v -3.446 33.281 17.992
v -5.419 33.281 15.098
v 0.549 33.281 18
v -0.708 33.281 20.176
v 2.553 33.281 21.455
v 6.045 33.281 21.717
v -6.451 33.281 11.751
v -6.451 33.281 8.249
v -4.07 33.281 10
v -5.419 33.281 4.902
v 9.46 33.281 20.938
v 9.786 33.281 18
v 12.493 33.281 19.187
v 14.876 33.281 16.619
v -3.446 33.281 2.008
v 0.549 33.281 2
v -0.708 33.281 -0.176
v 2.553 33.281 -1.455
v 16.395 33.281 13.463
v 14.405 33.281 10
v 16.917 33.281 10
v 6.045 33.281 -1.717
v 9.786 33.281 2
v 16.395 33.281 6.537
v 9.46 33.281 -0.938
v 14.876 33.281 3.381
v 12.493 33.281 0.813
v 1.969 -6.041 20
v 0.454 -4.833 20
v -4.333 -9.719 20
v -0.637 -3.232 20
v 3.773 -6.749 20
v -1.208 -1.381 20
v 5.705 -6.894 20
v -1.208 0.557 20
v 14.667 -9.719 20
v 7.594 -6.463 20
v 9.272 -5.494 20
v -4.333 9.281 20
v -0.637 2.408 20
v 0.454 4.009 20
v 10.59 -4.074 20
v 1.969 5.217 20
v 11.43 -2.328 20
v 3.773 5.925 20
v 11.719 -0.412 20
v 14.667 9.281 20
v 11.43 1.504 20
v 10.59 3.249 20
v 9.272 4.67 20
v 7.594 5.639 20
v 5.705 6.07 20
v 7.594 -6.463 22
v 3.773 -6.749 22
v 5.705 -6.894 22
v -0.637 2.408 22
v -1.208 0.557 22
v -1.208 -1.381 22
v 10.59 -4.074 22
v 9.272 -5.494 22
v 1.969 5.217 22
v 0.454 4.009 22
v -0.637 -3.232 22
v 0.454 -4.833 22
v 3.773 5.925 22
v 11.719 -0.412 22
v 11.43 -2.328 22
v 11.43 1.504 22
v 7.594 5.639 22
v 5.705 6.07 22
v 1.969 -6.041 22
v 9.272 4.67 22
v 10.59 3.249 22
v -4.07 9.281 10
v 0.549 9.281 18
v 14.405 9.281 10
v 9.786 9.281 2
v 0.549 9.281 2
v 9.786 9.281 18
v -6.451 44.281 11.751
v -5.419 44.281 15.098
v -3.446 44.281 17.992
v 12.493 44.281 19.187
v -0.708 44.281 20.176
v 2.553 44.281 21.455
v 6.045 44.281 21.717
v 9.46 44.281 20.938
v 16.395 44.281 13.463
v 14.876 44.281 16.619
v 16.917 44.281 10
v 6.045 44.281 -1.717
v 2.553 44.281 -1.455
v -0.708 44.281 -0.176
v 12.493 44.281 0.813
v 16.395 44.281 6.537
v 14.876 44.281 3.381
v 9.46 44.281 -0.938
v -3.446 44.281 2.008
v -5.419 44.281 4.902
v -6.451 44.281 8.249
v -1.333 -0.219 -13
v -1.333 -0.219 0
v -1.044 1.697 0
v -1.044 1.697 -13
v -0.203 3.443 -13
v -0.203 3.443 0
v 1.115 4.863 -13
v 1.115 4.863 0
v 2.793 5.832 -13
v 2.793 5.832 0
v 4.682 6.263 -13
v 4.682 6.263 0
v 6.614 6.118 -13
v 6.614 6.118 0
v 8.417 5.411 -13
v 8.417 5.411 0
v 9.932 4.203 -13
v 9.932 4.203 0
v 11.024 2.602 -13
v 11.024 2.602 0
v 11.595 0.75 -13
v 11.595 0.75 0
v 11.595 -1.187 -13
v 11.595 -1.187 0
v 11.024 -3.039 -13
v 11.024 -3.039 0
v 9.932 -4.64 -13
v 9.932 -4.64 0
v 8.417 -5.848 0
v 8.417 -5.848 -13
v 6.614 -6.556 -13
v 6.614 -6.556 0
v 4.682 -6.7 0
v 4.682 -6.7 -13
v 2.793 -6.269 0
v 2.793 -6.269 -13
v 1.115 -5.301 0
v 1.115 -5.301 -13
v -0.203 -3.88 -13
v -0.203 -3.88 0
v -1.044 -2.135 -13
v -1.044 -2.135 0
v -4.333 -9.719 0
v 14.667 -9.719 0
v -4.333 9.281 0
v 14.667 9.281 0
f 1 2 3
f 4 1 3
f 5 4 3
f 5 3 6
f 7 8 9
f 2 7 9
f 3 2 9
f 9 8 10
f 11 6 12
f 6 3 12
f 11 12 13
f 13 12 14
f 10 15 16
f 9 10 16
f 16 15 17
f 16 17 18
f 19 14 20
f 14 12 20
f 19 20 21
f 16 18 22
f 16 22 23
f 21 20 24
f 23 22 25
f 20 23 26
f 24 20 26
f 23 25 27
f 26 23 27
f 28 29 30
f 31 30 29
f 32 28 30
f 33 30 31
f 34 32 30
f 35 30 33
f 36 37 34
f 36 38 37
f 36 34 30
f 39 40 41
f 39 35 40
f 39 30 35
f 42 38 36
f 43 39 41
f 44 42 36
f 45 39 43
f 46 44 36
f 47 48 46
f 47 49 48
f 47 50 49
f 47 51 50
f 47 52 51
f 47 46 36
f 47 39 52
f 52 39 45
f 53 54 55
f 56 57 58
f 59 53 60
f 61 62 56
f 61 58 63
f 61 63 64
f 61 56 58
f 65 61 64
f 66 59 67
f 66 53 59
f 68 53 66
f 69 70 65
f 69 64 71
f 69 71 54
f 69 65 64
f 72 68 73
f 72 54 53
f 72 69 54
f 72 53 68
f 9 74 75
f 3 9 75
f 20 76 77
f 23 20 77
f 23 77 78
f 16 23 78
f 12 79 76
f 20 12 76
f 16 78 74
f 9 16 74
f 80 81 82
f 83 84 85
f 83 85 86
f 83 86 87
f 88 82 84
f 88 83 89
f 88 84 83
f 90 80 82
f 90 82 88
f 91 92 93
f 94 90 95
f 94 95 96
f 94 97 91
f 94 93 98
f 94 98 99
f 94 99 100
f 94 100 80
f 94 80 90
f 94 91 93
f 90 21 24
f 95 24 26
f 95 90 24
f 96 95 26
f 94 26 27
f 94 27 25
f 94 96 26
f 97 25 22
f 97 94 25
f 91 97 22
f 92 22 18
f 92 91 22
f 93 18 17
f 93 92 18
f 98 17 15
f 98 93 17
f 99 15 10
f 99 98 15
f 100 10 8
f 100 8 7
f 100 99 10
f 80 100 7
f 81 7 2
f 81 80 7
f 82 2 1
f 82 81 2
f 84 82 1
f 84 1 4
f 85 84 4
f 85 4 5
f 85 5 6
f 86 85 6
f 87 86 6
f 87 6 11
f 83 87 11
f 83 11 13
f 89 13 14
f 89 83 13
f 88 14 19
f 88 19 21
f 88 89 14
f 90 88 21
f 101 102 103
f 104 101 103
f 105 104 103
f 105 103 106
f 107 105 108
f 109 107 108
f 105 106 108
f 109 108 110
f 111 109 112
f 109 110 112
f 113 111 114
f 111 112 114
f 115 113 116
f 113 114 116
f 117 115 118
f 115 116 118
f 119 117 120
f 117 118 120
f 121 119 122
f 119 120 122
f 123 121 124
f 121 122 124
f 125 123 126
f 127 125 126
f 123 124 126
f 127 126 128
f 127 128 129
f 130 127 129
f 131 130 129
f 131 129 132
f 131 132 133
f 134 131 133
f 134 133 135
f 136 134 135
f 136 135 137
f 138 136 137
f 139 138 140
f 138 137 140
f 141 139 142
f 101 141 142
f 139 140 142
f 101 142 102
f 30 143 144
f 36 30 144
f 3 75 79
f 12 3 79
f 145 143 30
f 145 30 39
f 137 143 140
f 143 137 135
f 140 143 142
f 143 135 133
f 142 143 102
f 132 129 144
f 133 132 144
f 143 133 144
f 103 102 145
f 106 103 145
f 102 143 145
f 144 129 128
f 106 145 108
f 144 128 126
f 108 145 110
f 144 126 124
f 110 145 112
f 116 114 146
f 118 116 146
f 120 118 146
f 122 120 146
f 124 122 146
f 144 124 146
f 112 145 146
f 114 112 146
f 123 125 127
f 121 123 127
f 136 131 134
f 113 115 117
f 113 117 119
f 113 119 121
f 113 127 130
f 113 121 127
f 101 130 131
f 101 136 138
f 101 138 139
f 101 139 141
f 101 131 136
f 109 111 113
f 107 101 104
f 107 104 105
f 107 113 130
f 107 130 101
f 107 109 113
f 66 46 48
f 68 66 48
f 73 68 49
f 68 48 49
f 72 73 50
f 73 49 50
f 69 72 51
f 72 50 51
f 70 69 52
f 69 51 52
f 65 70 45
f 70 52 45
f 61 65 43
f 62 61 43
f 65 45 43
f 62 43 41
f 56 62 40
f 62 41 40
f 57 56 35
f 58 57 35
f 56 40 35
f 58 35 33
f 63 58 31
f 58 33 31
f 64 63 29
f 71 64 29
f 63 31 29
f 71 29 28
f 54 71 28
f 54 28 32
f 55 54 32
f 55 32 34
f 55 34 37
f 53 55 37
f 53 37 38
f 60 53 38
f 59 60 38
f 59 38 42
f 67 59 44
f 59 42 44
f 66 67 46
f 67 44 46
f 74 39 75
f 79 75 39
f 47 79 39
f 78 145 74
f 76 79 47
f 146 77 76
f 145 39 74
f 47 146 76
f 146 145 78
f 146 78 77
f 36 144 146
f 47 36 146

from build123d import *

# Parameters (mm, degrees)
SKETCH1_W           = 19
SKETCH1_H           = 19
BOSS_EXTRUDE1_DEPTH = 20
SKETCH2_R           = 6.5
BOSS_EXTRUDE2_DEPTH = 2
SKETCH3_R           = 6.5
BOSS_EXTRUDE3_DEPTH = 13
BOSS_EXTRUDE4_DEPTH = 35
SKETCH5_R           = 11.75
BOSS_EXTRUDE5_DEPTH = 11


with BuildPart() as part:
    # Sketch1 → Boss-Extrude1 (new body)
    with BuildSketch(Plane.XY):
        with Locations((5.167364017, -0.218619247)):
            Rectangle(SKETCH1_W, SKETCH1_H)
    extrude(amount=BOSS_EXTRUDE1_DEPTH)

    # Sketch2 → Boss-Extrude2 (add)
    with BuildSketch(Plane.XY.offset(20)):
        with Locations((5.218963732, -0.412118181)):
            Circle(SKETCH2_R)
    extrude(amount=BOSS_EXTRUDE2_DEPTH)

    # Sketch3 → Boss-Extrude3 (add)
    with BuildSketch(Plane(origin=(0, 0, 0), x_dir=(-1, 0, 0), z_dir=(0, 0, -1))):
        with Locations((-5.167364017, -0.218619247)):
            Circle(SKETCH3_R)
    extrude(amount=BOSS_EXTRUDE3_DEPTH)

    # Sketch4 → Boss-Extrude4 (add)
    with BuildSketch(Plane(origin=(0, 9.281380753, 0), x_dir=(1, 0, 0), z_dir=(0, 1, 0))):
        Polygon((14.404968324, -10), (9.78616617, -2), (0.548561863, -2), (-4.07024029, -10), (0.548561863, -18), (9.78616617, -18), align=None)
    extrude(amount=BOSS_EXTRUDE4_DEPTH)

    # Sketch5 → Boss-Extrude5 (add)
    with BuildSketch(Plane(origin=(0, 44.281380753, 0), x_dir=(1, 0, 0), z_dir=(0, 1, 0))):
        with Locations((5.167364017, -10)):
            Circle(SKETCH5_R)
    extrude(amount=-BOSS_EXTRUDE5_DEPTH)


solid = part.part
